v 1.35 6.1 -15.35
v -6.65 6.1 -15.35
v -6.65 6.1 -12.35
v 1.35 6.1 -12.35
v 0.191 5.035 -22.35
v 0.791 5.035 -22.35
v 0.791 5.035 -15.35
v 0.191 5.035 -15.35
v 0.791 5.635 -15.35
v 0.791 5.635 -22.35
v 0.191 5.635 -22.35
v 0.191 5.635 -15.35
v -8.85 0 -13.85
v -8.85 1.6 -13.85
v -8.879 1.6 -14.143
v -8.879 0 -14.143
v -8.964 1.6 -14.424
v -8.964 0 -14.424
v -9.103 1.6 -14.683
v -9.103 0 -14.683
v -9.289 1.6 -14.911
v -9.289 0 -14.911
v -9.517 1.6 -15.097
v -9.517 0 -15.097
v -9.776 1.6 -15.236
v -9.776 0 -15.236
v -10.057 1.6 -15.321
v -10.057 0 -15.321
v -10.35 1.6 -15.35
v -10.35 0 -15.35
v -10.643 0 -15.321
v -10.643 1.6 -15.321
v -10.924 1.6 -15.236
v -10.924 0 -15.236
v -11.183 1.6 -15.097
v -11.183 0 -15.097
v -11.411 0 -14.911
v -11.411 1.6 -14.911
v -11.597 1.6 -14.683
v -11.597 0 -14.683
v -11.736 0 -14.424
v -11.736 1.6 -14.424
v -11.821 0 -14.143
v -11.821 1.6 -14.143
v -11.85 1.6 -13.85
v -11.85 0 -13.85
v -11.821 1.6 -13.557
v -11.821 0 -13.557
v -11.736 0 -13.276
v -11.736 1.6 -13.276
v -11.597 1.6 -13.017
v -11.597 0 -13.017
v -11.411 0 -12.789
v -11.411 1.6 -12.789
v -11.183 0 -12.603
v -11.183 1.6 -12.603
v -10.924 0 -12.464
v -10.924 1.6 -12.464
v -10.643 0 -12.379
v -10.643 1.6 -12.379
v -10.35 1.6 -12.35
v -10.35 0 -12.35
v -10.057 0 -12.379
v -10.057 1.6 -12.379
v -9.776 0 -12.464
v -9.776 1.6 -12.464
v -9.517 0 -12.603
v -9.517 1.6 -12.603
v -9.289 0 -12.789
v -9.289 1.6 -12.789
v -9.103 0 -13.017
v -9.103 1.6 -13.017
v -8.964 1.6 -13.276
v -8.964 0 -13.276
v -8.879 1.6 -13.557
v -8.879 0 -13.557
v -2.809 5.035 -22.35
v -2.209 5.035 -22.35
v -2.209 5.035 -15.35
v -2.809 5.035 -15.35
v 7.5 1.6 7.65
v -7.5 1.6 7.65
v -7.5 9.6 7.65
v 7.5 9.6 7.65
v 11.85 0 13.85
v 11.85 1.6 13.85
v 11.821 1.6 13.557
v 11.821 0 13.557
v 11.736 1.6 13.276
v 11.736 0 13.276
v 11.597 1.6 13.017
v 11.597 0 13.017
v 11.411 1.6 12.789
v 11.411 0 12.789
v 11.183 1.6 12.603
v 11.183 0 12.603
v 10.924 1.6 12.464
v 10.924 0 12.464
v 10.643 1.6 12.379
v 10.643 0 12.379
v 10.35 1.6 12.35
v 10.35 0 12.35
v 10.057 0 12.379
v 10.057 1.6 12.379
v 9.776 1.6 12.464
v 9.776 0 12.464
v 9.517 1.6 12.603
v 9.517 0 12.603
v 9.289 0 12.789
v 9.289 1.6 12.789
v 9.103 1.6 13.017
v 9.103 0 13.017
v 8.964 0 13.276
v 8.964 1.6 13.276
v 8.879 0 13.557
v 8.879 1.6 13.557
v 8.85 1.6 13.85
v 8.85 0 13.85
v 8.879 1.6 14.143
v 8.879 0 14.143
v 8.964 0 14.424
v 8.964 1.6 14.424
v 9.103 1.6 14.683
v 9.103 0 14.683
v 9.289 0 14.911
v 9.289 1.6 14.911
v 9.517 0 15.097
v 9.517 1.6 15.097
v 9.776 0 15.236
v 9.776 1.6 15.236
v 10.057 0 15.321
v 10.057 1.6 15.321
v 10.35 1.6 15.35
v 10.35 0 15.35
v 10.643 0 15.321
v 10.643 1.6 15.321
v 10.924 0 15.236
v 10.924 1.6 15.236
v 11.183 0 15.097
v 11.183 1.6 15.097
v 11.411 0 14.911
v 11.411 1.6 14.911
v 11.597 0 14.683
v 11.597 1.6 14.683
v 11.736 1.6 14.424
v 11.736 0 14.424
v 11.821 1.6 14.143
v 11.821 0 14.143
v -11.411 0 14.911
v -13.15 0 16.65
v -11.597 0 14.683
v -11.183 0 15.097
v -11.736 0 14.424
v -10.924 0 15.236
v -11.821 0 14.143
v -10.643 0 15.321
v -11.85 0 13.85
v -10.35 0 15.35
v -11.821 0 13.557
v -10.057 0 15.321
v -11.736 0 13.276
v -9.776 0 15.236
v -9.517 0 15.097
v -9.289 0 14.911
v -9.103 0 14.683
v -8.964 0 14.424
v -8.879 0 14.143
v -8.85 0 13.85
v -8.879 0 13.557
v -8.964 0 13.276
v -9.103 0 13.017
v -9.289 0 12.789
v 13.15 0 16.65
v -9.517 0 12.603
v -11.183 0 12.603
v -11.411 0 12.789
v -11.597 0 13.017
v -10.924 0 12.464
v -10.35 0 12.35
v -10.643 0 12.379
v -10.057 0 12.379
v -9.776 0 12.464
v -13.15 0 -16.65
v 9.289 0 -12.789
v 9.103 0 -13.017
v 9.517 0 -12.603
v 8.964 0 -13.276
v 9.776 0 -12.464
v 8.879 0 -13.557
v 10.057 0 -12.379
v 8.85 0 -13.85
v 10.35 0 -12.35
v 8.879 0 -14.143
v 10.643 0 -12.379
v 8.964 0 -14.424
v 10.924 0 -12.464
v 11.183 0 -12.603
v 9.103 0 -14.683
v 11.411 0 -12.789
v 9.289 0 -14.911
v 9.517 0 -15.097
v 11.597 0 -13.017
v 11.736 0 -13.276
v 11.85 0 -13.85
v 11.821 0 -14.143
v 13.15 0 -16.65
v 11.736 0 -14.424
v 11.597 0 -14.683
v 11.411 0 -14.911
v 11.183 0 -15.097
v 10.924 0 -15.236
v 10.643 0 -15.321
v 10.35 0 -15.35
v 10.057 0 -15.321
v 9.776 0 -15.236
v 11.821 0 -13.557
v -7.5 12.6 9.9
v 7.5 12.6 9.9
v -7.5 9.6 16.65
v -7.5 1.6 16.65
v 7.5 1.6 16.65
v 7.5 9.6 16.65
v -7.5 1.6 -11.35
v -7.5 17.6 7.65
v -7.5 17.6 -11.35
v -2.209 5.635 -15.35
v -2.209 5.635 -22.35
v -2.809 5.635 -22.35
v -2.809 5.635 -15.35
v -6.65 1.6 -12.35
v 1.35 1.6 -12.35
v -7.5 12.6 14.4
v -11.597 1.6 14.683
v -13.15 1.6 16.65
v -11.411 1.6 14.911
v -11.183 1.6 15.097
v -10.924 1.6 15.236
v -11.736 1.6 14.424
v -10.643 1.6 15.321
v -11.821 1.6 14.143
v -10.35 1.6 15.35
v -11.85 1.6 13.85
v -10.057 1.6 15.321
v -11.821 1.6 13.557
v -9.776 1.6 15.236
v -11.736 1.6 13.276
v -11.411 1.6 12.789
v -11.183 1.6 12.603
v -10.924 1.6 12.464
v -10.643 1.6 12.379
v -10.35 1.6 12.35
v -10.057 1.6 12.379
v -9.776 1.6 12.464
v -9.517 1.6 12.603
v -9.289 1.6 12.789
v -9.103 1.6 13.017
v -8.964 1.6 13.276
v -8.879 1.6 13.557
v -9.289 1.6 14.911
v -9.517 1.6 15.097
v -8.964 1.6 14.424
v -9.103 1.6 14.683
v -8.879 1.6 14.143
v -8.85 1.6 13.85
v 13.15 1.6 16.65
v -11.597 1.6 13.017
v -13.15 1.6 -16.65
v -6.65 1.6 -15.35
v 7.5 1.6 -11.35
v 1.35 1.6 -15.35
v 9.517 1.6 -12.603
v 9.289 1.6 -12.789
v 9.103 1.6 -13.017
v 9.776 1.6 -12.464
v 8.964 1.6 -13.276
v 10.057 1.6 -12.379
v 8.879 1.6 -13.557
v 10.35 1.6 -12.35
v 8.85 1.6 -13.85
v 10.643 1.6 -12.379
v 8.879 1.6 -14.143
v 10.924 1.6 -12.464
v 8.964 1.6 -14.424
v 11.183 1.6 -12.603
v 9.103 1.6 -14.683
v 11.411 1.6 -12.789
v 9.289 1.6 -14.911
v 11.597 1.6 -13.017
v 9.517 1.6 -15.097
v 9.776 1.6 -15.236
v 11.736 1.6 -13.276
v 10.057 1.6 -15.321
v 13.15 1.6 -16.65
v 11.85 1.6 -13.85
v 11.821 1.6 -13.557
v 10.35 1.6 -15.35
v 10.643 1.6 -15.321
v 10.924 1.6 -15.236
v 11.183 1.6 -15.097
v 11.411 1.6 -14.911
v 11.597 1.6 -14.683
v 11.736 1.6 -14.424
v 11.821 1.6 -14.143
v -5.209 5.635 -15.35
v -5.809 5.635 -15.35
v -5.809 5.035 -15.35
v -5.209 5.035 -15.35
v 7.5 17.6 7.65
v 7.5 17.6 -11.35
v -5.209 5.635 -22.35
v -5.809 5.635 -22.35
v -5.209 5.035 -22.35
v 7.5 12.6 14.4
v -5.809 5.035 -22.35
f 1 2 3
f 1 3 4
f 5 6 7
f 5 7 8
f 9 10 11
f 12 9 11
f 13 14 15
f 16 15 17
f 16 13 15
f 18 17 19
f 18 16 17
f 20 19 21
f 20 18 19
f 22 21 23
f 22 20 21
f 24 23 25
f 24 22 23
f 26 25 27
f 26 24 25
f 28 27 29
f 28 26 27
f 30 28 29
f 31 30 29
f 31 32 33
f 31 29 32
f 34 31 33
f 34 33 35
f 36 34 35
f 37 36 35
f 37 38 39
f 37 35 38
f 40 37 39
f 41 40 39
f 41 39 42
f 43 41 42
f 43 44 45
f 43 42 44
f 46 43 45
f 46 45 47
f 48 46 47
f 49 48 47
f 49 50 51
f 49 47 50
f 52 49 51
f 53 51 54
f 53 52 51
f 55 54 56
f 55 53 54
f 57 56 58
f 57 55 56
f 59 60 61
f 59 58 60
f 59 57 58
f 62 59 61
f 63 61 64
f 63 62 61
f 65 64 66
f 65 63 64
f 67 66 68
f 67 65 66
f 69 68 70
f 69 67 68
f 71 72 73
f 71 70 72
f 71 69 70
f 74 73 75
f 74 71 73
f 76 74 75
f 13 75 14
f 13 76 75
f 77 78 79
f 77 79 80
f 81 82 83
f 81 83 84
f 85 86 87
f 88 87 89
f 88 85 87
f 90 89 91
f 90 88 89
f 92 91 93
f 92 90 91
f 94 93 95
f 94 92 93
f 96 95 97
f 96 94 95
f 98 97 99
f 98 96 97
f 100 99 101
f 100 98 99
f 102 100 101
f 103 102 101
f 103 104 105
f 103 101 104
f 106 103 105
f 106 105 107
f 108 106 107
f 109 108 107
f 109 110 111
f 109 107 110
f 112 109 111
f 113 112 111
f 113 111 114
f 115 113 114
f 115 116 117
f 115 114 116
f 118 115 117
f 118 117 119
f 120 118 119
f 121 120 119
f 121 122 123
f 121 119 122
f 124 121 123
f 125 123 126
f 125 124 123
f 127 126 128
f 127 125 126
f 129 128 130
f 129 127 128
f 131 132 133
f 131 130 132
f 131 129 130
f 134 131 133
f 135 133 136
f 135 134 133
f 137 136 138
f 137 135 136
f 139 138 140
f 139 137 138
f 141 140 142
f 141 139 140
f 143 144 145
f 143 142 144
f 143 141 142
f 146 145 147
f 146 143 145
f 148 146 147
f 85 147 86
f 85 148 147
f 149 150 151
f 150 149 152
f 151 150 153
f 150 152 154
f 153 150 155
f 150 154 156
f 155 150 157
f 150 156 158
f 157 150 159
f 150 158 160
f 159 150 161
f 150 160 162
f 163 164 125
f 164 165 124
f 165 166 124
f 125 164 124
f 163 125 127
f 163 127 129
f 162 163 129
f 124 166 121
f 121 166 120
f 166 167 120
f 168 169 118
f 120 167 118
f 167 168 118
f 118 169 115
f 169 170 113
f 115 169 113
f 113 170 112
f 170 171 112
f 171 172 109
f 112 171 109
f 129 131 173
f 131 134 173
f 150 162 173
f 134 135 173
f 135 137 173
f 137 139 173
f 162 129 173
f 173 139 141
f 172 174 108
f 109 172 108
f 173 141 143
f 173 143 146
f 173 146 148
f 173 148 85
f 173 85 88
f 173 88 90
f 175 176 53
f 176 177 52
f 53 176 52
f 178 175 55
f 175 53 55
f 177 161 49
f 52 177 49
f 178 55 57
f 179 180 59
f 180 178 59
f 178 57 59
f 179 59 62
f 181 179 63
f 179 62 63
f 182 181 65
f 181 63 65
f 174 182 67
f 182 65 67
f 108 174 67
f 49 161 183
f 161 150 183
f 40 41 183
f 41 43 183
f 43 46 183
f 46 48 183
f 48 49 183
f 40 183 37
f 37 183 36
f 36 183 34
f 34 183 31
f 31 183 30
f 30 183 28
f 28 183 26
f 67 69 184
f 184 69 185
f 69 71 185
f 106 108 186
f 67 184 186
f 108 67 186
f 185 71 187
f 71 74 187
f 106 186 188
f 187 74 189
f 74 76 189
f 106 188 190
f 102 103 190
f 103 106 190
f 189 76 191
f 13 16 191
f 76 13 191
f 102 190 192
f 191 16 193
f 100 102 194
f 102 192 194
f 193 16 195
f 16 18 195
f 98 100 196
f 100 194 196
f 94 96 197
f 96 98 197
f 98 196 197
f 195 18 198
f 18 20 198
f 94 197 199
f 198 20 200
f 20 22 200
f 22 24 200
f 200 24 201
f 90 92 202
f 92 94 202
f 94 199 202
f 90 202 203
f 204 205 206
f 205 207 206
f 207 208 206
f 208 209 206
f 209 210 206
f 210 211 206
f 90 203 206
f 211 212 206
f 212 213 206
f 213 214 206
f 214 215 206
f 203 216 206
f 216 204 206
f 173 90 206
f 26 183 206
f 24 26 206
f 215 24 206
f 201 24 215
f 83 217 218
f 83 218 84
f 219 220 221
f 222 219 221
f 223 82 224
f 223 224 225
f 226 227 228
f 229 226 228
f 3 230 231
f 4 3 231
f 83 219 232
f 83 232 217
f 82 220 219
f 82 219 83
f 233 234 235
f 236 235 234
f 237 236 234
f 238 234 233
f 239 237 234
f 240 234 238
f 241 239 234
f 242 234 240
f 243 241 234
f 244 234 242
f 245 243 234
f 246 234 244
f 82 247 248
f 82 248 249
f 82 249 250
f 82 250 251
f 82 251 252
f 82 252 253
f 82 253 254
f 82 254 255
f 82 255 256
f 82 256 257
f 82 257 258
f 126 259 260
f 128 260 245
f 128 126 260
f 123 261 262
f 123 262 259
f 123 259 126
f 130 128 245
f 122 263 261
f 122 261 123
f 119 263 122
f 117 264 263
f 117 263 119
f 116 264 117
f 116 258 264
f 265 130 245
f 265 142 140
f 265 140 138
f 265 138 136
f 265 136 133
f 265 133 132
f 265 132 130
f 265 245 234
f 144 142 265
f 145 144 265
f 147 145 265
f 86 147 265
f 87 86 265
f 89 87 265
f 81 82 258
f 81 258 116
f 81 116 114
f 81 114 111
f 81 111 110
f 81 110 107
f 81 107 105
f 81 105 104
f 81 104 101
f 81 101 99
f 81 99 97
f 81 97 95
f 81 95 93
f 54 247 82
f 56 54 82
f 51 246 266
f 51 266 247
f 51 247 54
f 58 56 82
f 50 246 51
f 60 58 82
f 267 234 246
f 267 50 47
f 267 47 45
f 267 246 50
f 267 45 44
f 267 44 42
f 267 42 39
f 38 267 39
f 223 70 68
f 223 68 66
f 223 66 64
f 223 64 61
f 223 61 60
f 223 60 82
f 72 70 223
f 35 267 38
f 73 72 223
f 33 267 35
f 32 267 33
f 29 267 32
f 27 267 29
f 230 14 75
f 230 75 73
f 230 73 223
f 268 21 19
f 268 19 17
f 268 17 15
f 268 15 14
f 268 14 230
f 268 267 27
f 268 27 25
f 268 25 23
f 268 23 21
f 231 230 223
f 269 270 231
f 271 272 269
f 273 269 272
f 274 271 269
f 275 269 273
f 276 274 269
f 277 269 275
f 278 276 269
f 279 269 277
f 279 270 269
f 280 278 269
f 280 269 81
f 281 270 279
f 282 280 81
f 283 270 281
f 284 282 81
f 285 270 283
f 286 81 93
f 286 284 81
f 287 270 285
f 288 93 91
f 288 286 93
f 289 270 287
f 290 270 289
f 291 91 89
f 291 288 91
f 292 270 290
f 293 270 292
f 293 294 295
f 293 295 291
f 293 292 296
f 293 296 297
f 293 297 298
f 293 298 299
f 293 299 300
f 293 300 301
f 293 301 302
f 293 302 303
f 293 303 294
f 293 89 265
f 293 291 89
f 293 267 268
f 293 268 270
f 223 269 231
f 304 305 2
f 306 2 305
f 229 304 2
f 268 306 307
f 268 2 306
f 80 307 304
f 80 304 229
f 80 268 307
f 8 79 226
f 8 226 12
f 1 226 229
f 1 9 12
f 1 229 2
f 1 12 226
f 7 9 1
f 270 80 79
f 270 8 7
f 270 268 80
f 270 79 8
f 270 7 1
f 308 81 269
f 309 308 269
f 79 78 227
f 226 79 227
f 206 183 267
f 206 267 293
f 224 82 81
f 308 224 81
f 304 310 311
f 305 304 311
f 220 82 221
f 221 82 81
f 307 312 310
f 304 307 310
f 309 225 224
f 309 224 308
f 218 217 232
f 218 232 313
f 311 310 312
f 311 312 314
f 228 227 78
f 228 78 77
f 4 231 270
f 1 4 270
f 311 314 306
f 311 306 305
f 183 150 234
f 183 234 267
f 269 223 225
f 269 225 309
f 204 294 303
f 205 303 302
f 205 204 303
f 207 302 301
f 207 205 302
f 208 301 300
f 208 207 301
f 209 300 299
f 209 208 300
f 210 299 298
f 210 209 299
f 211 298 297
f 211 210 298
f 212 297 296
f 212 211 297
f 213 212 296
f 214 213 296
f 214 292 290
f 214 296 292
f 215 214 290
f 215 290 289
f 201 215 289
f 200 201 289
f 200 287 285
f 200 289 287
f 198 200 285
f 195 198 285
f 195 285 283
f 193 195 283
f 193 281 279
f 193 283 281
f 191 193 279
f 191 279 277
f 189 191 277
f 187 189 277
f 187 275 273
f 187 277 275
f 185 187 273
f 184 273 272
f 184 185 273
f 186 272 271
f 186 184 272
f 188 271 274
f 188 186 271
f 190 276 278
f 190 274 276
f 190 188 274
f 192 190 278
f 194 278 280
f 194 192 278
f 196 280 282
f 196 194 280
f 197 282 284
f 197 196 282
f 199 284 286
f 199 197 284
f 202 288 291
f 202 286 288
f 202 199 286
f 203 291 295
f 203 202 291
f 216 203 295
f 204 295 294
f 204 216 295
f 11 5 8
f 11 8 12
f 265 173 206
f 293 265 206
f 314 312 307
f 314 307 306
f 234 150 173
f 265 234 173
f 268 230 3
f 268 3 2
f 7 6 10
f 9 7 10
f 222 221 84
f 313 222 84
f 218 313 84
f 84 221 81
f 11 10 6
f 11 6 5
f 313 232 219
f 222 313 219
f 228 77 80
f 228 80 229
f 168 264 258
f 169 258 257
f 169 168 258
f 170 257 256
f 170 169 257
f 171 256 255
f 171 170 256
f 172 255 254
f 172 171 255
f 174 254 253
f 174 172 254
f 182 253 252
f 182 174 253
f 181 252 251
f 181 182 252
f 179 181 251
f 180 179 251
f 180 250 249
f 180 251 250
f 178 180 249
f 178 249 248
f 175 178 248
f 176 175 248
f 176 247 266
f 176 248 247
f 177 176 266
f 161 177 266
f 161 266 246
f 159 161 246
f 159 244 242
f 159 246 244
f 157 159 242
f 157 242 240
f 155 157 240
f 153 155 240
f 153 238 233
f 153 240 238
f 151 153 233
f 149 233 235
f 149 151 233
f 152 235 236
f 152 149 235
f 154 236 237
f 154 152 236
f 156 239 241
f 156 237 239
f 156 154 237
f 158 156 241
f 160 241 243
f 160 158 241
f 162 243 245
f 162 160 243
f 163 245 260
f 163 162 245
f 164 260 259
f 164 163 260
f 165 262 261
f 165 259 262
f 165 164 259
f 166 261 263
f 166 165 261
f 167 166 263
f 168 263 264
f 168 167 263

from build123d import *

# Parameters (mm, degrees)
SKETCH2_W       = 26.3
SKETCH2_H       = 33.3
EXTRUDE1_DEPTH  = 1.6
SKETCH3_W       = 15
SKETCH3_H       = 19
EXTRUDE2_DEPTH  = 16
SKETCH4_W       = 15
SKETCH4_H       = 9
EXTRUDE3_DEPTH  = 11
EXTRUDE5_DEPTH  = 21.65
SKETCH8_W       = 8
SKETCH8_H       = 3
EXTRUDE6_DEPTH  = 4.5
SKETCH9_W       = 0.6
SKETCH9_H       = 0.6
EXTRUDE9_DEPTH  = 7
SKETCH10_R      = 1.5
EXTRUDE10_DEPTH = 18.6


with BuildPart() as part:
    # Sketch2 → Extrude1 (new body)
    with BuildSketch(Plane(origin=(0, 0, 0), x_dir=(1, 0, 0), z_dir=(0, 1, 0))):
        Rectangle(SKETCH2_W, SKETCH2_H)
    extrude(amount=EXTRUDE1_DEPTH)

    # Sketch3 → Extrude2 (add)
    with BuildSketch(Plane(origin=(0, 1.6, 0), x_dir=(1, 0, 0), z_dir=(0, 1, 0))):
        with Locations((0, 1.85)):
            Rectangle(SKETCH3_W, SKETCH3_H)
    extrude(amount=EXTRUDE2_DEPTH)

    # Sketch8 → Extrude6 (add)
    with BuildSketch(Plane(origin=(0, 1.6, 0), x_dir=(1, 0, 0), z_dir=(0, 1, 0))):
        with Locations((-2.65, 13.85)):
            Rectangle(SKETCH8_W, SKETCH8_H)
    extrude(amount=EXTRUDE6_DEPTH)

    # Sketch9 → Extrude9 (add)
    with BuildSketch(Plane(origin=(0, 0, -15.35), x_dir=(-1, 0, 0), z_dir=(0, 0, -1))):
        with Locations((2.508816384, 5.335265534)):
            Rectangle(SKETCH9_W, SKETCH9_H)
        with Locations((-0.491183616, 5.335265534)):
            Rectangle(SKETCH9_W, SKETCH9_H)
        with Locations((5.508816384, 5.335265534)):
            Rectangle(SKETCH9_W, SKETCH9_H)
    extrude(amount=EXTRUDE9_DEPTH)

    # Sketch10 → Extrude10 (cut, through all)
    with BuildSketch(Plane(origin=(0, 0, 0), x_dir=(1, 0, 0), z_dir=(0, 1, 0))):
        with Locations((-10.35, -13.85)):
            Circle(SKETCH10_R)
        with Locations((10.35, -13.85)):
            Circle(SKETCH10_R)
        with Locations((10.35, 13.85)):
            Circle(SKETCH10_R)
        with Locations((-10.35, 13.85)):
            Circle(SKETCH10_R)
    extrude(amount=EXTRUDE10_DEPTH, mode=Mode.SUBTRACT)


with BuildPart() as body_2:
    # Sketch4 → Extrude3 (new body)
    with BuildSketch(Plane(origin=(0, 1.6, 0), x_dir=(1, 0, 0), z_dir=(0, 1, 0))):
        with Locations((0, -12.15)):
            Rectangle(SKETCH4_W, SKETCH4_H)
    extrude(amount=EXTRUDE3_DEPTH)

    # Sketch7 → Extrude5 (cut, through all)
    with BuildSketch(Plane.ZY.offset(7.5)):
        Polygon((9.9, 12.6), (7.65, 9.6), (7.65, 12.6), align=None)
        Polygon((16.65, 9.6), (16.65, 12.6), (14.4, 12.6), align=None)
    extrude(amount=-EXTRUDE5_DEPTH, mode=Mode.SUBTRACT)


solid = Compound([part.part, body_2.part])
